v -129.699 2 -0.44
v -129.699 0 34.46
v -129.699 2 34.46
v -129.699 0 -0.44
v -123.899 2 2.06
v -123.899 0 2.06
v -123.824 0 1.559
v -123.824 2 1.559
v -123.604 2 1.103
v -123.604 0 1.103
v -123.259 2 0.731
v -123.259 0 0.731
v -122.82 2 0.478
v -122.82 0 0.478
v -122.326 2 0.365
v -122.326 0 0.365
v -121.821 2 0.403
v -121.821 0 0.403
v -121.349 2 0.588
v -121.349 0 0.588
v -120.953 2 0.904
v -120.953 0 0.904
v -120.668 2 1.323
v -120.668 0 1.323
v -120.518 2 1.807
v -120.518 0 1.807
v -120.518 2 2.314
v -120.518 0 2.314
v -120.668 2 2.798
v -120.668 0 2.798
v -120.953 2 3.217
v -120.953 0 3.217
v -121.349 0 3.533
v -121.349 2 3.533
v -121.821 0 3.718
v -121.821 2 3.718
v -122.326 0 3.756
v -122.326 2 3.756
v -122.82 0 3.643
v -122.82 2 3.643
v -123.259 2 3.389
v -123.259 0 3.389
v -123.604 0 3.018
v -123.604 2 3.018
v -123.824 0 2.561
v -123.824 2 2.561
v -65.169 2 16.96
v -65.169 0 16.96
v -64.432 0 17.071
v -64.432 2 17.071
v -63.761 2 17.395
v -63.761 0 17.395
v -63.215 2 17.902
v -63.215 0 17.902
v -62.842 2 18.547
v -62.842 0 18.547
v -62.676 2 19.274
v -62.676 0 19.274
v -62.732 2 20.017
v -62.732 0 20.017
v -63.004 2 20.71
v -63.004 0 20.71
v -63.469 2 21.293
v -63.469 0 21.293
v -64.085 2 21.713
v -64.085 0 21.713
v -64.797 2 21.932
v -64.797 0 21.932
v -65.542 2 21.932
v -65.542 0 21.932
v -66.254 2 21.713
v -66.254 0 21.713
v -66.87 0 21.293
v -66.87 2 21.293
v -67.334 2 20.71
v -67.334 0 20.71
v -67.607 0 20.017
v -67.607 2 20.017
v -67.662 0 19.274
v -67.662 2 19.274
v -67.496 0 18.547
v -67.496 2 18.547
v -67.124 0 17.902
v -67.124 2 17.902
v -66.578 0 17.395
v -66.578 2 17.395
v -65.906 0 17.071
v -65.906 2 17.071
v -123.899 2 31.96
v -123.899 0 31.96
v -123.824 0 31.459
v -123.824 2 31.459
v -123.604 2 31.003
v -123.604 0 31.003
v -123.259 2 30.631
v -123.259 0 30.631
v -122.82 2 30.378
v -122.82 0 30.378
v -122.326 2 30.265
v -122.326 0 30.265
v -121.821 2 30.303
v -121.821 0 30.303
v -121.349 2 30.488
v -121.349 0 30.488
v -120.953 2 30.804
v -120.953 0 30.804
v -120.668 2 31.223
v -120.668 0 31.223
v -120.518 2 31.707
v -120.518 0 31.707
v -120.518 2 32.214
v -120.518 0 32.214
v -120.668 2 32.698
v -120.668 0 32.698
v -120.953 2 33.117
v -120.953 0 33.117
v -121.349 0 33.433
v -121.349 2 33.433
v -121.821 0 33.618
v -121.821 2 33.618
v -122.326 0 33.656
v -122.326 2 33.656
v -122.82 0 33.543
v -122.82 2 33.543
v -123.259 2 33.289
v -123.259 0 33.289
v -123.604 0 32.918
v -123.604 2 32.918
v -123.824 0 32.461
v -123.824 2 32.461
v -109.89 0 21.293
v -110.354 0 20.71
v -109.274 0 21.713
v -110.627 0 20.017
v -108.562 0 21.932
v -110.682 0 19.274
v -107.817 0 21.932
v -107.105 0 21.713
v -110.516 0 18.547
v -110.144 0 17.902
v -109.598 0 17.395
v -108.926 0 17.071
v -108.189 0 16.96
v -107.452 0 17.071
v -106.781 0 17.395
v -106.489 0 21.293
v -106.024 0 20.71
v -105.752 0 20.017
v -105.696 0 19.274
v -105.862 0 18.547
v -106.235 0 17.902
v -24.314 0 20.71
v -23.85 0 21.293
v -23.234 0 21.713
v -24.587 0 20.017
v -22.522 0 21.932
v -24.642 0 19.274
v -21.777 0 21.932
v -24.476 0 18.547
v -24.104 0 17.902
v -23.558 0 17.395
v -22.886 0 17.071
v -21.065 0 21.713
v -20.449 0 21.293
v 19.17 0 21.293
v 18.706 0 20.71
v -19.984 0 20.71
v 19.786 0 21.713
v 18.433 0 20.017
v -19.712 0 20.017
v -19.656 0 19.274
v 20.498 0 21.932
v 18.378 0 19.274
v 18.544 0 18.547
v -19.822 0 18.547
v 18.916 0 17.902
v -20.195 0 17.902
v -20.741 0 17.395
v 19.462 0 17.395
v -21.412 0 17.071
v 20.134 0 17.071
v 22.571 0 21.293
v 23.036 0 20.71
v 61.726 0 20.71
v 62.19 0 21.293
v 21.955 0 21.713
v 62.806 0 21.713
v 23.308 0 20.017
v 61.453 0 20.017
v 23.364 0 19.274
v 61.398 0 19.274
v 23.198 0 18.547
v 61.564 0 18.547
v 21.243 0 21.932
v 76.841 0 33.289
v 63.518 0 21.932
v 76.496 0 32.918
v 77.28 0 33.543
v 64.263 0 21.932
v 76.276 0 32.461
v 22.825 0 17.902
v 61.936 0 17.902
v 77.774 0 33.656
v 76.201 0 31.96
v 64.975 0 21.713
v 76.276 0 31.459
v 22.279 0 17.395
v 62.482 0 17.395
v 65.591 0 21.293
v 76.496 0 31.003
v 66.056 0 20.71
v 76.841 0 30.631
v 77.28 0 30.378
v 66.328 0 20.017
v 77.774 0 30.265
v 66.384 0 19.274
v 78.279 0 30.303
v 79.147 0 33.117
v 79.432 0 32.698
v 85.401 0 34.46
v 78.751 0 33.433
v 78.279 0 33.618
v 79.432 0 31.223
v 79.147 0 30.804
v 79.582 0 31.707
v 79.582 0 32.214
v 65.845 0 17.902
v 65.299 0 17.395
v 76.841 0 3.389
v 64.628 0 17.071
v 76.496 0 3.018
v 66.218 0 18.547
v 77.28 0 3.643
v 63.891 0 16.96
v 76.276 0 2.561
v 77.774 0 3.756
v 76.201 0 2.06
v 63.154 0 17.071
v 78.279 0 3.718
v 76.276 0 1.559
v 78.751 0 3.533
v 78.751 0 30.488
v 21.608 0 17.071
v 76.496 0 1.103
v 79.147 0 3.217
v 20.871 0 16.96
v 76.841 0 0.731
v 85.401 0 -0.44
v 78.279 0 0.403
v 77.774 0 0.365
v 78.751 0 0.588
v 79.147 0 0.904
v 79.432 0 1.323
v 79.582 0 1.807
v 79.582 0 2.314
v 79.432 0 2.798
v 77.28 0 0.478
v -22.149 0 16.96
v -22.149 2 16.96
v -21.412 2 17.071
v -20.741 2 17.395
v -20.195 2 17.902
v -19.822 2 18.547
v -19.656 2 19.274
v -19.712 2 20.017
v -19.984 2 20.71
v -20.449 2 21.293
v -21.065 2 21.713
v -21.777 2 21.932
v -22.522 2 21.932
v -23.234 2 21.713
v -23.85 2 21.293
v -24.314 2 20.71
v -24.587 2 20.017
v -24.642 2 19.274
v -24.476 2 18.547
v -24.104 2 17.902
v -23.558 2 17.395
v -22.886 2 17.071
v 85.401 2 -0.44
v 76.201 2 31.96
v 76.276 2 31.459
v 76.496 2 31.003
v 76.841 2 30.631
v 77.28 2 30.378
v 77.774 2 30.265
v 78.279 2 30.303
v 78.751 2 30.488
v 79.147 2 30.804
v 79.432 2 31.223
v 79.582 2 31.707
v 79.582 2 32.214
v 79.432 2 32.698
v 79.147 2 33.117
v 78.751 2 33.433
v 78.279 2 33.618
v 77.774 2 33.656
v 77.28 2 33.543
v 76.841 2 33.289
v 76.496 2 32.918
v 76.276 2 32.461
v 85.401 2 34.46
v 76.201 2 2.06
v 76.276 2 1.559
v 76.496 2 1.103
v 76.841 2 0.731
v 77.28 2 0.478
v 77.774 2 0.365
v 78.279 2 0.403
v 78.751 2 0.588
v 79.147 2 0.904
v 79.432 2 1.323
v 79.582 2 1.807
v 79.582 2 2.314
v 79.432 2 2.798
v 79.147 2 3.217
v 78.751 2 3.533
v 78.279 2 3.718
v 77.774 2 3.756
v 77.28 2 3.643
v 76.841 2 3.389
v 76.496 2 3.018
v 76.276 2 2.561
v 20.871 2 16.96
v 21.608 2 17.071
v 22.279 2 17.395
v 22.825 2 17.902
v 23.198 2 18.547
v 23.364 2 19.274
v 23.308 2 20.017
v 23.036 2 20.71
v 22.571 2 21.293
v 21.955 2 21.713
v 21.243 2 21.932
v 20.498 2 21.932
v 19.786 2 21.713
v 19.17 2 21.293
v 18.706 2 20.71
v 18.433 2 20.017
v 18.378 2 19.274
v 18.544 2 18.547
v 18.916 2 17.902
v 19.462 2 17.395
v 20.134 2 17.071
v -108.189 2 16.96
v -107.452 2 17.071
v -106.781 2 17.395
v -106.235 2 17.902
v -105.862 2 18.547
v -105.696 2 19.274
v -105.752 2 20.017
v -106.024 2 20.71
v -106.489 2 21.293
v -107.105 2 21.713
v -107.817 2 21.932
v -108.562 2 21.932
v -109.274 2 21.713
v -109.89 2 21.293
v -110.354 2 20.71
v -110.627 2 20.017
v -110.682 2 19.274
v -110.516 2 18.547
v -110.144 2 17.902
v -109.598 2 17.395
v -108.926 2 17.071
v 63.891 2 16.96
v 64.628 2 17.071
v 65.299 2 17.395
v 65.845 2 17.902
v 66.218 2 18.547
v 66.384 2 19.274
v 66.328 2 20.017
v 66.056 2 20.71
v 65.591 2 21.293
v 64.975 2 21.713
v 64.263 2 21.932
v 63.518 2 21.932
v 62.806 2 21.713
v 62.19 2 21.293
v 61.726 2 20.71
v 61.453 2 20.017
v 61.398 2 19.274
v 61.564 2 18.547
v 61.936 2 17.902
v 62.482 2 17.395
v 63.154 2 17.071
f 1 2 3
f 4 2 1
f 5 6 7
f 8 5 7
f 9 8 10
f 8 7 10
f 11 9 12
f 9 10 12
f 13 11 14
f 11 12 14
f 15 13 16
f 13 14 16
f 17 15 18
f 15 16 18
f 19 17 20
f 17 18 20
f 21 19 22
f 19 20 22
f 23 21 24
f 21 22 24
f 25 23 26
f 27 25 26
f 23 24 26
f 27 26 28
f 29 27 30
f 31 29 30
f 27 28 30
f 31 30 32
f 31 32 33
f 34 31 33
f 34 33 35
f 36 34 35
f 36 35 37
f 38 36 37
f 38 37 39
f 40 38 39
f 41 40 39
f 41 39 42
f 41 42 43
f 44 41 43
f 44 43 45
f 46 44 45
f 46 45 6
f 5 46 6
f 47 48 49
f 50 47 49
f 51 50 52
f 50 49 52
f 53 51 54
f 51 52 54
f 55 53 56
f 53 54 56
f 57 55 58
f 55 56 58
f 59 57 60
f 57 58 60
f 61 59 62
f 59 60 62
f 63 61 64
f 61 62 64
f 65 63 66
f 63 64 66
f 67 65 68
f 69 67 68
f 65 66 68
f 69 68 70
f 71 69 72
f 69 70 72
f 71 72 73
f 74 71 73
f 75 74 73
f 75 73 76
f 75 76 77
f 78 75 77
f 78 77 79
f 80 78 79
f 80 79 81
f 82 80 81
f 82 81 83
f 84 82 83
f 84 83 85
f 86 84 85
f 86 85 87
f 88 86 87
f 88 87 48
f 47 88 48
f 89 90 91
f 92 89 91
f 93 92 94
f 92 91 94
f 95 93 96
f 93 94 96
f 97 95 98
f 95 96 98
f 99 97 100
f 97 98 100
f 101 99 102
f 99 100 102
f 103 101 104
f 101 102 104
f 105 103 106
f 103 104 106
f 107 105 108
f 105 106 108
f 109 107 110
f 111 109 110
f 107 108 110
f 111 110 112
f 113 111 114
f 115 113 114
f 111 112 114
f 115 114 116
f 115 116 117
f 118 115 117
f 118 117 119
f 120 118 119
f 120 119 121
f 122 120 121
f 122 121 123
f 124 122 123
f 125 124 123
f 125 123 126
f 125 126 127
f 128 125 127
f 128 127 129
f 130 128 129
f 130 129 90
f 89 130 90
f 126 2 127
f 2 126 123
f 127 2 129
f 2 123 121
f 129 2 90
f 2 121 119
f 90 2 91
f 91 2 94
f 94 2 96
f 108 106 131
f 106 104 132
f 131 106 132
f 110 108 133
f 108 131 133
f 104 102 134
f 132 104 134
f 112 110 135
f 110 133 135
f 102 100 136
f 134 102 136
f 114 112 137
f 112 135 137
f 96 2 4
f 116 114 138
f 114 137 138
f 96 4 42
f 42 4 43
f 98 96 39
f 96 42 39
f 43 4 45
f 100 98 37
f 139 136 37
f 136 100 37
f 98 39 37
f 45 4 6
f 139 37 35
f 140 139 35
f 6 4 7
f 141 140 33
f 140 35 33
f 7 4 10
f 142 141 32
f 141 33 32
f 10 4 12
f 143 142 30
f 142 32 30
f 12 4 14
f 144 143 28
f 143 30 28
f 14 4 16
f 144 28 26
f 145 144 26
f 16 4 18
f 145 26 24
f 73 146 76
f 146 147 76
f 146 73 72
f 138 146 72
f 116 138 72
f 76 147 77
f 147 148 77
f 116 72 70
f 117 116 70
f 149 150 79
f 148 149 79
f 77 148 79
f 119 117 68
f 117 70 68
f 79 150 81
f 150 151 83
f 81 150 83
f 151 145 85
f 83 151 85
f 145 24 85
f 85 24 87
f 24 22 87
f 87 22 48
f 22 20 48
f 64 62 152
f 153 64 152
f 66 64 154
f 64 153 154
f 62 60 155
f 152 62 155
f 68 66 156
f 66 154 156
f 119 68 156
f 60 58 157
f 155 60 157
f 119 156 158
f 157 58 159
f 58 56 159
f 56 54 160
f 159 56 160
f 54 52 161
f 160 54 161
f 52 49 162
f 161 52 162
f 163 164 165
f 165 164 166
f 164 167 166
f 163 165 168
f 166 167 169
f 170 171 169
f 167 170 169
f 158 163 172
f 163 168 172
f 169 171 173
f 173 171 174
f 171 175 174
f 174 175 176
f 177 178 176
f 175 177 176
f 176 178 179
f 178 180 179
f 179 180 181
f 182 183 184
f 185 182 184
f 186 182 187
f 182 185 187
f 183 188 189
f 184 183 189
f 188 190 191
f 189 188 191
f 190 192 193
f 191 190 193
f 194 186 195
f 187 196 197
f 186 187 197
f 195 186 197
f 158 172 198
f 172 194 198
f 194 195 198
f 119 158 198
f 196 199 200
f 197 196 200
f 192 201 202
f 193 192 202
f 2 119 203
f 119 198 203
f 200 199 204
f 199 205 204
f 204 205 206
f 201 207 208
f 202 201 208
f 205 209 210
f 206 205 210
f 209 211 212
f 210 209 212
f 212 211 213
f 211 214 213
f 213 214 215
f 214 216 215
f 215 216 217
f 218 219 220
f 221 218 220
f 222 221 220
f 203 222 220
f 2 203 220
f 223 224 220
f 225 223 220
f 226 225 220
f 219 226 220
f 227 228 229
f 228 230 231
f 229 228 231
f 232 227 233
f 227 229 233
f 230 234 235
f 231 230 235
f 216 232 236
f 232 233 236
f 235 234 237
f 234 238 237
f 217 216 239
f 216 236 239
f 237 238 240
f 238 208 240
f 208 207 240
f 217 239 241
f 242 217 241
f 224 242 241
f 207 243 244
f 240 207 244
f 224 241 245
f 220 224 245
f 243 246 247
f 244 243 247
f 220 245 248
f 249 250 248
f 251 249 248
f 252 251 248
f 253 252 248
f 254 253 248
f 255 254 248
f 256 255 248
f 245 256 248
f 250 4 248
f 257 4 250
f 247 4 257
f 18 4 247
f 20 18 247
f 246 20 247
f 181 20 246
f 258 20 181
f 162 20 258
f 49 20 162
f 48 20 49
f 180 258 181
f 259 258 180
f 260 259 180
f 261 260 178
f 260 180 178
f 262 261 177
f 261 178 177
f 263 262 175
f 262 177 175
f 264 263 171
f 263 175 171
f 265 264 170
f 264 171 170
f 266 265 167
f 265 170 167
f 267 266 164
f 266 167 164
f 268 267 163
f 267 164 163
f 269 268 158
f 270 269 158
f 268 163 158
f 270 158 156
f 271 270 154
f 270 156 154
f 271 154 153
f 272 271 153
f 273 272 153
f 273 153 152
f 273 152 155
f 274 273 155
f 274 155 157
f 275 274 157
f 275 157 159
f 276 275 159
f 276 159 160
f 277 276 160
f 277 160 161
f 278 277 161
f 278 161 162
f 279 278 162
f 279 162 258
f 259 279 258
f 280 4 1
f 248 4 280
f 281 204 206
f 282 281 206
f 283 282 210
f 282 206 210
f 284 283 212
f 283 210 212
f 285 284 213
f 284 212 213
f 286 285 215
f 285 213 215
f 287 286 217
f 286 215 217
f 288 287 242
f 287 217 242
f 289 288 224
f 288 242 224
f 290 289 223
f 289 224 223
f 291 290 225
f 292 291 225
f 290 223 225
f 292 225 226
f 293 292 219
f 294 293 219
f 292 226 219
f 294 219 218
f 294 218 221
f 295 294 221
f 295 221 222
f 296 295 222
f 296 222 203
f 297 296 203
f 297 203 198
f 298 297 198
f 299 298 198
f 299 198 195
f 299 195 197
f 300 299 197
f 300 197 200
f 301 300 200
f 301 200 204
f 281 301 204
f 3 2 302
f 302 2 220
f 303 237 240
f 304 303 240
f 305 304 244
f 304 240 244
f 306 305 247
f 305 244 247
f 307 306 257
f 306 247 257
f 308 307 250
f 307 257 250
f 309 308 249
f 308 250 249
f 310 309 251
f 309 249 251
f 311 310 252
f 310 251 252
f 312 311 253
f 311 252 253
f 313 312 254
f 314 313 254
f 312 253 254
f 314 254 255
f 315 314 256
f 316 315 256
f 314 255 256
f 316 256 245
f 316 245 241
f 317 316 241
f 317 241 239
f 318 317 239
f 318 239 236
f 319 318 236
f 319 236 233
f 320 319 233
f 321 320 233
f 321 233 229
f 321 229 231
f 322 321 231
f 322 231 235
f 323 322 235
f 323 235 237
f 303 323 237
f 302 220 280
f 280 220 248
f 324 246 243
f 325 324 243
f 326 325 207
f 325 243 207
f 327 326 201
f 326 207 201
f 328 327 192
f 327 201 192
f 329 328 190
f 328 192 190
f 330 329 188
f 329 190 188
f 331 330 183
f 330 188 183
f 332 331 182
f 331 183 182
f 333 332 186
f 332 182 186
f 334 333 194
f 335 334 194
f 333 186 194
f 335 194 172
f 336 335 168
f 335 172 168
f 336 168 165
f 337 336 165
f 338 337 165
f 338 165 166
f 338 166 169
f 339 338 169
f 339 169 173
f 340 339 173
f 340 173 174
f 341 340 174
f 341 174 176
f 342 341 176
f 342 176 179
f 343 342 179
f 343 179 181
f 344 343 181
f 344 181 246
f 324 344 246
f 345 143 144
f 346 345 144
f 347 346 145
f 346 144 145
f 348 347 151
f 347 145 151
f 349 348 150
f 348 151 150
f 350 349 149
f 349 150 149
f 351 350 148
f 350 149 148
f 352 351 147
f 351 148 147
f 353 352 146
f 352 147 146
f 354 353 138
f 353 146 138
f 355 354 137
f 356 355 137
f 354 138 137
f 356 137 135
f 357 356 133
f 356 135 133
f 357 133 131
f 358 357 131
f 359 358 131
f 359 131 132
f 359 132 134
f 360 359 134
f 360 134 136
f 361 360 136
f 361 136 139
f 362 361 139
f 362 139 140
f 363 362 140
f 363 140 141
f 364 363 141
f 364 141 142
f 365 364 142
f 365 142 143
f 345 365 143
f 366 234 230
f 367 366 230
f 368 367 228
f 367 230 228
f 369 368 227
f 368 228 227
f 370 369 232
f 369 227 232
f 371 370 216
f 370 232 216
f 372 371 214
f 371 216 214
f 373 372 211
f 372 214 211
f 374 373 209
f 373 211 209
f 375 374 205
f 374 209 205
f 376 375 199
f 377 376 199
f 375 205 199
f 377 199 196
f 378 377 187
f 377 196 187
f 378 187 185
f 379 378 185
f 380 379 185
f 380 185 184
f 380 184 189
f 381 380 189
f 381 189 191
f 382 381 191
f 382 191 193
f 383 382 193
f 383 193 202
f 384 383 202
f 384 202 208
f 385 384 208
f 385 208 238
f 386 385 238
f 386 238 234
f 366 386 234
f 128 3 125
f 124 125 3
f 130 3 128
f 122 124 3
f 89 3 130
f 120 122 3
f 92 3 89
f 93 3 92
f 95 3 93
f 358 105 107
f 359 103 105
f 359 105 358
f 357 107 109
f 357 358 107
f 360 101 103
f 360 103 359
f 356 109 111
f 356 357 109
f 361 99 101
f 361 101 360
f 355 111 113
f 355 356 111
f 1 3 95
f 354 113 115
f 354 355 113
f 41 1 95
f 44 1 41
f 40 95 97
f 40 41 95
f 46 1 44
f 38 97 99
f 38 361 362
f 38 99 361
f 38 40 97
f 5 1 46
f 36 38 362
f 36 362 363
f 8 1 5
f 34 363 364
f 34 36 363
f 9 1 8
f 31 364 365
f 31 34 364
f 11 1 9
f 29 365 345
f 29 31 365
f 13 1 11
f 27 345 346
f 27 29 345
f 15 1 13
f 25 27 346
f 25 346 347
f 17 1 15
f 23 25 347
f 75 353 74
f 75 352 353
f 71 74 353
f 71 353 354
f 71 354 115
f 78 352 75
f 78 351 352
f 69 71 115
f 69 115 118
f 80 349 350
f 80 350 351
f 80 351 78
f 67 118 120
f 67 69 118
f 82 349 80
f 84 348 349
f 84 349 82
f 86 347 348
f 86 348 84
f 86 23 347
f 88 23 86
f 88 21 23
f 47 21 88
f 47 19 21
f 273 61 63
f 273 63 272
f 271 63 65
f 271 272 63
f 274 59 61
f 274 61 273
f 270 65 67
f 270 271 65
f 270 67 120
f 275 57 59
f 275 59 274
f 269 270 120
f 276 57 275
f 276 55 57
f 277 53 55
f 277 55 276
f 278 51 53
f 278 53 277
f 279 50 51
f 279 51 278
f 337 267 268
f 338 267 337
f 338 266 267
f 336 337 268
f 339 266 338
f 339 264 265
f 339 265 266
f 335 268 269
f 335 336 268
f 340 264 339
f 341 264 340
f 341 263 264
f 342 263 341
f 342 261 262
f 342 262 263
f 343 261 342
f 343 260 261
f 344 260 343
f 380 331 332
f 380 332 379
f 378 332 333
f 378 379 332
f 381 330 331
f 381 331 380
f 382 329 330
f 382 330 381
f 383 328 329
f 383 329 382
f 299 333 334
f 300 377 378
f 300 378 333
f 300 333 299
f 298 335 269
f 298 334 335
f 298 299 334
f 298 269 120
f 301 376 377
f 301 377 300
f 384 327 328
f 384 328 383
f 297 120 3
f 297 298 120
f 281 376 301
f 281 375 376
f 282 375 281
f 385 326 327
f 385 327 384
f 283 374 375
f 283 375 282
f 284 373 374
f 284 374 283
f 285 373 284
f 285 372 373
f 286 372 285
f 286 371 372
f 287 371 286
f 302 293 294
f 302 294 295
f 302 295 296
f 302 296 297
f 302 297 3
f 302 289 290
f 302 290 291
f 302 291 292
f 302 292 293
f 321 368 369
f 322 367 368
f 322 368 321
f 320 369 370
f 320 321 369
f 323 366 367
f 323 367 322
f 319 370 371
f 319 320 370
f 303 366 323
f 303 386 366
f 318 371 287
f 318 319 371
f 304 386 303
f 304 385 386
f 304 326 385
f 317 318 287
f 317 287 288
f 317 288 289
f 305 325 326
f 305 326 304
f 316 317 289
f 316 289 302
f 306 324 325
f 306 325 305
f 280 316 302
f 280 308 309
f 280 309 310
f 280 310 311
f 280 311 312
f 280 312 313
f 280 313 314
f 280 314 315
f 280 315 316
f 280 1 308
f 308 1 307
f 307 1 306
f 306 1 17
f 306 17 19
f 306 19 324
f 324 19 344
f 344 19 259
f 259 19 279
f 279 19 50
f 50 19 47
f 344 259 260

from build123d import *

# Parameters (mm, degrees)
SKETCH2_W            = 215.1
SKETCH2_H            = 34.9
BOSS_EXTRUDE1_DEPTH  = 2
M3_CLEARANCE_HOLE1_D = 3.4
CUT_EXTRUDE1_REACH   = 136.214
SKETCH7_R            = 2.5


with BuildPart() as part:
    # Sketch2 → Boss-Extrude1 (new body)
    with BuildSketch(Plane(origin=(0, 0, 0), x_dir=(1, 0, 0), z_dir=(0, 1, 0))):
        with Locations((-22.149288499, -17.010354253)):
            Rectangle(SKETCH2_W, SKETCH2_H)
    extrude(amount=BOSS_EXTRUDE1_DEPTH)

    # M3 Clearance Hole1 (through all)
    with Locations(Plane(origin=(0, 2, 0), x_dir=(1, 0, 0), z_dir=(0, 1, 0))):
        with Locations((-122.199288499, -2.060354253), (-122.199288499, -31.960354253), (77.900711501, -2.060354253), (77.900711501, -31.960354253)):
            Hole(M3_CLEARANCE_HOLE1_D / 2)

    # Sketch7 → Cut-Extrude1 (cut, up to next)
    with BuildSketch(Plane.XZ, mode=Mode.PRIVATE) as cut_extrude1_sk1:
        with Locations(Location((-108.189288499, 19.460354253, 0), (0, 0, 270))):
            Circle(SKETCH7_R)
    cut_extrude1_tool1 = extrude(cut_extrude1_sk1.sketch, amount=-CUT_EXTRUDE1_REACH, mode=Mode.PRIVATE) & part.part
    # Sketch7 → Cut-Extrude1 (cut, up to next)
    with BuildSketch(Plane.XZ, mode=Mode.PRIVATE) as cut_extrude1_sk2:
        with Locations(Location((-65.169288499, 19.460354253, 0), (0, 0, 270))):
            Circle(SKETCH7_R)
    cut_extrude1_tool2 = extrude(cut_extrude1_sk2.sketch, amount=-CUT_EXTRUDE1_REACH, mode=Mode.PRIVATE) & part.part
    # Sketch7 → Cut-Extrude1 (cut, up to next)
    with BuildSketch(Plane.XZ, mode=Mode.PRIVATE) as cut_extrude1_sk3:
        with Locations(Location((-22.149288499, 19.460354253, 0), (0, 0, 270))):
            Circle(SKETCH7_R)
    cut_extrude1_tool3 = extrude(cut_extrude1_sk3.sketch, amount=-CUT_EXTRUDE1_REACH, mode=Mode.PRIVATE) & part.part
    # Sketch7 → Cut-Extrude1 (cut, up to next)
    with BuildSketch(Plane.XZ, mode=Mode.PRIVATE) as cut_extrude1_sk4:
        with Locations(Location((20.870711501, 19.460354253, 0), (0, 0, 270))):
            Circle(SKETCH7_R)
    cut_extrude1_tool4 = extrude(cut_extrude1_sk4.sketch, amount=-CUT_EXTRUDE1_REACH, mode=Mode.PRIVATE) & part.part
    # Sketch7 → Cut-Extrude1 (cut, up to next)
    with BuildSketch(Plane.XZ, mode=Mode.PRIVATE) as cut_extrude1_sk5:
        with Locations(Location((63.890711501, 19.460354253, 0), (0, 0, 270))):
            Circle(SKETCH7_R)
    cut_extrude1_tool5 = extrude(cut_extrude1_sk5.sketch, amount=-CUT_EXTRUDE1_REACH, mode=Mode.PRIVATE) & part.part
    add(cut_extrude1_tool1.solids().sort_by_distance((-108.189288, 0, 19.460354))[0], mode=Mode.SUBTRACT)
    add(cut_extrude1_tool2.solids().sort_by_distance((-65.169288, 0, 19.460354))[0], mode=Mode.SUBTRACT)
    add(cut_extrude1_tool3.solids().sort_by_distance((-22.149288, 0, 19.460354))[0], mode=Mode.SUBTRACT)
    add(cut_extrude1_tool4.solids().sort_by_distance((20.870712, 0, 19.460354))[0], mode=Mode.SUBTRACT)
    add(cut_extrude1_tool5.solids().sort_by_distance((63.890712, 0, 19.460354))[0], mode=Mode.SUBTRACT)


solid = part.part
